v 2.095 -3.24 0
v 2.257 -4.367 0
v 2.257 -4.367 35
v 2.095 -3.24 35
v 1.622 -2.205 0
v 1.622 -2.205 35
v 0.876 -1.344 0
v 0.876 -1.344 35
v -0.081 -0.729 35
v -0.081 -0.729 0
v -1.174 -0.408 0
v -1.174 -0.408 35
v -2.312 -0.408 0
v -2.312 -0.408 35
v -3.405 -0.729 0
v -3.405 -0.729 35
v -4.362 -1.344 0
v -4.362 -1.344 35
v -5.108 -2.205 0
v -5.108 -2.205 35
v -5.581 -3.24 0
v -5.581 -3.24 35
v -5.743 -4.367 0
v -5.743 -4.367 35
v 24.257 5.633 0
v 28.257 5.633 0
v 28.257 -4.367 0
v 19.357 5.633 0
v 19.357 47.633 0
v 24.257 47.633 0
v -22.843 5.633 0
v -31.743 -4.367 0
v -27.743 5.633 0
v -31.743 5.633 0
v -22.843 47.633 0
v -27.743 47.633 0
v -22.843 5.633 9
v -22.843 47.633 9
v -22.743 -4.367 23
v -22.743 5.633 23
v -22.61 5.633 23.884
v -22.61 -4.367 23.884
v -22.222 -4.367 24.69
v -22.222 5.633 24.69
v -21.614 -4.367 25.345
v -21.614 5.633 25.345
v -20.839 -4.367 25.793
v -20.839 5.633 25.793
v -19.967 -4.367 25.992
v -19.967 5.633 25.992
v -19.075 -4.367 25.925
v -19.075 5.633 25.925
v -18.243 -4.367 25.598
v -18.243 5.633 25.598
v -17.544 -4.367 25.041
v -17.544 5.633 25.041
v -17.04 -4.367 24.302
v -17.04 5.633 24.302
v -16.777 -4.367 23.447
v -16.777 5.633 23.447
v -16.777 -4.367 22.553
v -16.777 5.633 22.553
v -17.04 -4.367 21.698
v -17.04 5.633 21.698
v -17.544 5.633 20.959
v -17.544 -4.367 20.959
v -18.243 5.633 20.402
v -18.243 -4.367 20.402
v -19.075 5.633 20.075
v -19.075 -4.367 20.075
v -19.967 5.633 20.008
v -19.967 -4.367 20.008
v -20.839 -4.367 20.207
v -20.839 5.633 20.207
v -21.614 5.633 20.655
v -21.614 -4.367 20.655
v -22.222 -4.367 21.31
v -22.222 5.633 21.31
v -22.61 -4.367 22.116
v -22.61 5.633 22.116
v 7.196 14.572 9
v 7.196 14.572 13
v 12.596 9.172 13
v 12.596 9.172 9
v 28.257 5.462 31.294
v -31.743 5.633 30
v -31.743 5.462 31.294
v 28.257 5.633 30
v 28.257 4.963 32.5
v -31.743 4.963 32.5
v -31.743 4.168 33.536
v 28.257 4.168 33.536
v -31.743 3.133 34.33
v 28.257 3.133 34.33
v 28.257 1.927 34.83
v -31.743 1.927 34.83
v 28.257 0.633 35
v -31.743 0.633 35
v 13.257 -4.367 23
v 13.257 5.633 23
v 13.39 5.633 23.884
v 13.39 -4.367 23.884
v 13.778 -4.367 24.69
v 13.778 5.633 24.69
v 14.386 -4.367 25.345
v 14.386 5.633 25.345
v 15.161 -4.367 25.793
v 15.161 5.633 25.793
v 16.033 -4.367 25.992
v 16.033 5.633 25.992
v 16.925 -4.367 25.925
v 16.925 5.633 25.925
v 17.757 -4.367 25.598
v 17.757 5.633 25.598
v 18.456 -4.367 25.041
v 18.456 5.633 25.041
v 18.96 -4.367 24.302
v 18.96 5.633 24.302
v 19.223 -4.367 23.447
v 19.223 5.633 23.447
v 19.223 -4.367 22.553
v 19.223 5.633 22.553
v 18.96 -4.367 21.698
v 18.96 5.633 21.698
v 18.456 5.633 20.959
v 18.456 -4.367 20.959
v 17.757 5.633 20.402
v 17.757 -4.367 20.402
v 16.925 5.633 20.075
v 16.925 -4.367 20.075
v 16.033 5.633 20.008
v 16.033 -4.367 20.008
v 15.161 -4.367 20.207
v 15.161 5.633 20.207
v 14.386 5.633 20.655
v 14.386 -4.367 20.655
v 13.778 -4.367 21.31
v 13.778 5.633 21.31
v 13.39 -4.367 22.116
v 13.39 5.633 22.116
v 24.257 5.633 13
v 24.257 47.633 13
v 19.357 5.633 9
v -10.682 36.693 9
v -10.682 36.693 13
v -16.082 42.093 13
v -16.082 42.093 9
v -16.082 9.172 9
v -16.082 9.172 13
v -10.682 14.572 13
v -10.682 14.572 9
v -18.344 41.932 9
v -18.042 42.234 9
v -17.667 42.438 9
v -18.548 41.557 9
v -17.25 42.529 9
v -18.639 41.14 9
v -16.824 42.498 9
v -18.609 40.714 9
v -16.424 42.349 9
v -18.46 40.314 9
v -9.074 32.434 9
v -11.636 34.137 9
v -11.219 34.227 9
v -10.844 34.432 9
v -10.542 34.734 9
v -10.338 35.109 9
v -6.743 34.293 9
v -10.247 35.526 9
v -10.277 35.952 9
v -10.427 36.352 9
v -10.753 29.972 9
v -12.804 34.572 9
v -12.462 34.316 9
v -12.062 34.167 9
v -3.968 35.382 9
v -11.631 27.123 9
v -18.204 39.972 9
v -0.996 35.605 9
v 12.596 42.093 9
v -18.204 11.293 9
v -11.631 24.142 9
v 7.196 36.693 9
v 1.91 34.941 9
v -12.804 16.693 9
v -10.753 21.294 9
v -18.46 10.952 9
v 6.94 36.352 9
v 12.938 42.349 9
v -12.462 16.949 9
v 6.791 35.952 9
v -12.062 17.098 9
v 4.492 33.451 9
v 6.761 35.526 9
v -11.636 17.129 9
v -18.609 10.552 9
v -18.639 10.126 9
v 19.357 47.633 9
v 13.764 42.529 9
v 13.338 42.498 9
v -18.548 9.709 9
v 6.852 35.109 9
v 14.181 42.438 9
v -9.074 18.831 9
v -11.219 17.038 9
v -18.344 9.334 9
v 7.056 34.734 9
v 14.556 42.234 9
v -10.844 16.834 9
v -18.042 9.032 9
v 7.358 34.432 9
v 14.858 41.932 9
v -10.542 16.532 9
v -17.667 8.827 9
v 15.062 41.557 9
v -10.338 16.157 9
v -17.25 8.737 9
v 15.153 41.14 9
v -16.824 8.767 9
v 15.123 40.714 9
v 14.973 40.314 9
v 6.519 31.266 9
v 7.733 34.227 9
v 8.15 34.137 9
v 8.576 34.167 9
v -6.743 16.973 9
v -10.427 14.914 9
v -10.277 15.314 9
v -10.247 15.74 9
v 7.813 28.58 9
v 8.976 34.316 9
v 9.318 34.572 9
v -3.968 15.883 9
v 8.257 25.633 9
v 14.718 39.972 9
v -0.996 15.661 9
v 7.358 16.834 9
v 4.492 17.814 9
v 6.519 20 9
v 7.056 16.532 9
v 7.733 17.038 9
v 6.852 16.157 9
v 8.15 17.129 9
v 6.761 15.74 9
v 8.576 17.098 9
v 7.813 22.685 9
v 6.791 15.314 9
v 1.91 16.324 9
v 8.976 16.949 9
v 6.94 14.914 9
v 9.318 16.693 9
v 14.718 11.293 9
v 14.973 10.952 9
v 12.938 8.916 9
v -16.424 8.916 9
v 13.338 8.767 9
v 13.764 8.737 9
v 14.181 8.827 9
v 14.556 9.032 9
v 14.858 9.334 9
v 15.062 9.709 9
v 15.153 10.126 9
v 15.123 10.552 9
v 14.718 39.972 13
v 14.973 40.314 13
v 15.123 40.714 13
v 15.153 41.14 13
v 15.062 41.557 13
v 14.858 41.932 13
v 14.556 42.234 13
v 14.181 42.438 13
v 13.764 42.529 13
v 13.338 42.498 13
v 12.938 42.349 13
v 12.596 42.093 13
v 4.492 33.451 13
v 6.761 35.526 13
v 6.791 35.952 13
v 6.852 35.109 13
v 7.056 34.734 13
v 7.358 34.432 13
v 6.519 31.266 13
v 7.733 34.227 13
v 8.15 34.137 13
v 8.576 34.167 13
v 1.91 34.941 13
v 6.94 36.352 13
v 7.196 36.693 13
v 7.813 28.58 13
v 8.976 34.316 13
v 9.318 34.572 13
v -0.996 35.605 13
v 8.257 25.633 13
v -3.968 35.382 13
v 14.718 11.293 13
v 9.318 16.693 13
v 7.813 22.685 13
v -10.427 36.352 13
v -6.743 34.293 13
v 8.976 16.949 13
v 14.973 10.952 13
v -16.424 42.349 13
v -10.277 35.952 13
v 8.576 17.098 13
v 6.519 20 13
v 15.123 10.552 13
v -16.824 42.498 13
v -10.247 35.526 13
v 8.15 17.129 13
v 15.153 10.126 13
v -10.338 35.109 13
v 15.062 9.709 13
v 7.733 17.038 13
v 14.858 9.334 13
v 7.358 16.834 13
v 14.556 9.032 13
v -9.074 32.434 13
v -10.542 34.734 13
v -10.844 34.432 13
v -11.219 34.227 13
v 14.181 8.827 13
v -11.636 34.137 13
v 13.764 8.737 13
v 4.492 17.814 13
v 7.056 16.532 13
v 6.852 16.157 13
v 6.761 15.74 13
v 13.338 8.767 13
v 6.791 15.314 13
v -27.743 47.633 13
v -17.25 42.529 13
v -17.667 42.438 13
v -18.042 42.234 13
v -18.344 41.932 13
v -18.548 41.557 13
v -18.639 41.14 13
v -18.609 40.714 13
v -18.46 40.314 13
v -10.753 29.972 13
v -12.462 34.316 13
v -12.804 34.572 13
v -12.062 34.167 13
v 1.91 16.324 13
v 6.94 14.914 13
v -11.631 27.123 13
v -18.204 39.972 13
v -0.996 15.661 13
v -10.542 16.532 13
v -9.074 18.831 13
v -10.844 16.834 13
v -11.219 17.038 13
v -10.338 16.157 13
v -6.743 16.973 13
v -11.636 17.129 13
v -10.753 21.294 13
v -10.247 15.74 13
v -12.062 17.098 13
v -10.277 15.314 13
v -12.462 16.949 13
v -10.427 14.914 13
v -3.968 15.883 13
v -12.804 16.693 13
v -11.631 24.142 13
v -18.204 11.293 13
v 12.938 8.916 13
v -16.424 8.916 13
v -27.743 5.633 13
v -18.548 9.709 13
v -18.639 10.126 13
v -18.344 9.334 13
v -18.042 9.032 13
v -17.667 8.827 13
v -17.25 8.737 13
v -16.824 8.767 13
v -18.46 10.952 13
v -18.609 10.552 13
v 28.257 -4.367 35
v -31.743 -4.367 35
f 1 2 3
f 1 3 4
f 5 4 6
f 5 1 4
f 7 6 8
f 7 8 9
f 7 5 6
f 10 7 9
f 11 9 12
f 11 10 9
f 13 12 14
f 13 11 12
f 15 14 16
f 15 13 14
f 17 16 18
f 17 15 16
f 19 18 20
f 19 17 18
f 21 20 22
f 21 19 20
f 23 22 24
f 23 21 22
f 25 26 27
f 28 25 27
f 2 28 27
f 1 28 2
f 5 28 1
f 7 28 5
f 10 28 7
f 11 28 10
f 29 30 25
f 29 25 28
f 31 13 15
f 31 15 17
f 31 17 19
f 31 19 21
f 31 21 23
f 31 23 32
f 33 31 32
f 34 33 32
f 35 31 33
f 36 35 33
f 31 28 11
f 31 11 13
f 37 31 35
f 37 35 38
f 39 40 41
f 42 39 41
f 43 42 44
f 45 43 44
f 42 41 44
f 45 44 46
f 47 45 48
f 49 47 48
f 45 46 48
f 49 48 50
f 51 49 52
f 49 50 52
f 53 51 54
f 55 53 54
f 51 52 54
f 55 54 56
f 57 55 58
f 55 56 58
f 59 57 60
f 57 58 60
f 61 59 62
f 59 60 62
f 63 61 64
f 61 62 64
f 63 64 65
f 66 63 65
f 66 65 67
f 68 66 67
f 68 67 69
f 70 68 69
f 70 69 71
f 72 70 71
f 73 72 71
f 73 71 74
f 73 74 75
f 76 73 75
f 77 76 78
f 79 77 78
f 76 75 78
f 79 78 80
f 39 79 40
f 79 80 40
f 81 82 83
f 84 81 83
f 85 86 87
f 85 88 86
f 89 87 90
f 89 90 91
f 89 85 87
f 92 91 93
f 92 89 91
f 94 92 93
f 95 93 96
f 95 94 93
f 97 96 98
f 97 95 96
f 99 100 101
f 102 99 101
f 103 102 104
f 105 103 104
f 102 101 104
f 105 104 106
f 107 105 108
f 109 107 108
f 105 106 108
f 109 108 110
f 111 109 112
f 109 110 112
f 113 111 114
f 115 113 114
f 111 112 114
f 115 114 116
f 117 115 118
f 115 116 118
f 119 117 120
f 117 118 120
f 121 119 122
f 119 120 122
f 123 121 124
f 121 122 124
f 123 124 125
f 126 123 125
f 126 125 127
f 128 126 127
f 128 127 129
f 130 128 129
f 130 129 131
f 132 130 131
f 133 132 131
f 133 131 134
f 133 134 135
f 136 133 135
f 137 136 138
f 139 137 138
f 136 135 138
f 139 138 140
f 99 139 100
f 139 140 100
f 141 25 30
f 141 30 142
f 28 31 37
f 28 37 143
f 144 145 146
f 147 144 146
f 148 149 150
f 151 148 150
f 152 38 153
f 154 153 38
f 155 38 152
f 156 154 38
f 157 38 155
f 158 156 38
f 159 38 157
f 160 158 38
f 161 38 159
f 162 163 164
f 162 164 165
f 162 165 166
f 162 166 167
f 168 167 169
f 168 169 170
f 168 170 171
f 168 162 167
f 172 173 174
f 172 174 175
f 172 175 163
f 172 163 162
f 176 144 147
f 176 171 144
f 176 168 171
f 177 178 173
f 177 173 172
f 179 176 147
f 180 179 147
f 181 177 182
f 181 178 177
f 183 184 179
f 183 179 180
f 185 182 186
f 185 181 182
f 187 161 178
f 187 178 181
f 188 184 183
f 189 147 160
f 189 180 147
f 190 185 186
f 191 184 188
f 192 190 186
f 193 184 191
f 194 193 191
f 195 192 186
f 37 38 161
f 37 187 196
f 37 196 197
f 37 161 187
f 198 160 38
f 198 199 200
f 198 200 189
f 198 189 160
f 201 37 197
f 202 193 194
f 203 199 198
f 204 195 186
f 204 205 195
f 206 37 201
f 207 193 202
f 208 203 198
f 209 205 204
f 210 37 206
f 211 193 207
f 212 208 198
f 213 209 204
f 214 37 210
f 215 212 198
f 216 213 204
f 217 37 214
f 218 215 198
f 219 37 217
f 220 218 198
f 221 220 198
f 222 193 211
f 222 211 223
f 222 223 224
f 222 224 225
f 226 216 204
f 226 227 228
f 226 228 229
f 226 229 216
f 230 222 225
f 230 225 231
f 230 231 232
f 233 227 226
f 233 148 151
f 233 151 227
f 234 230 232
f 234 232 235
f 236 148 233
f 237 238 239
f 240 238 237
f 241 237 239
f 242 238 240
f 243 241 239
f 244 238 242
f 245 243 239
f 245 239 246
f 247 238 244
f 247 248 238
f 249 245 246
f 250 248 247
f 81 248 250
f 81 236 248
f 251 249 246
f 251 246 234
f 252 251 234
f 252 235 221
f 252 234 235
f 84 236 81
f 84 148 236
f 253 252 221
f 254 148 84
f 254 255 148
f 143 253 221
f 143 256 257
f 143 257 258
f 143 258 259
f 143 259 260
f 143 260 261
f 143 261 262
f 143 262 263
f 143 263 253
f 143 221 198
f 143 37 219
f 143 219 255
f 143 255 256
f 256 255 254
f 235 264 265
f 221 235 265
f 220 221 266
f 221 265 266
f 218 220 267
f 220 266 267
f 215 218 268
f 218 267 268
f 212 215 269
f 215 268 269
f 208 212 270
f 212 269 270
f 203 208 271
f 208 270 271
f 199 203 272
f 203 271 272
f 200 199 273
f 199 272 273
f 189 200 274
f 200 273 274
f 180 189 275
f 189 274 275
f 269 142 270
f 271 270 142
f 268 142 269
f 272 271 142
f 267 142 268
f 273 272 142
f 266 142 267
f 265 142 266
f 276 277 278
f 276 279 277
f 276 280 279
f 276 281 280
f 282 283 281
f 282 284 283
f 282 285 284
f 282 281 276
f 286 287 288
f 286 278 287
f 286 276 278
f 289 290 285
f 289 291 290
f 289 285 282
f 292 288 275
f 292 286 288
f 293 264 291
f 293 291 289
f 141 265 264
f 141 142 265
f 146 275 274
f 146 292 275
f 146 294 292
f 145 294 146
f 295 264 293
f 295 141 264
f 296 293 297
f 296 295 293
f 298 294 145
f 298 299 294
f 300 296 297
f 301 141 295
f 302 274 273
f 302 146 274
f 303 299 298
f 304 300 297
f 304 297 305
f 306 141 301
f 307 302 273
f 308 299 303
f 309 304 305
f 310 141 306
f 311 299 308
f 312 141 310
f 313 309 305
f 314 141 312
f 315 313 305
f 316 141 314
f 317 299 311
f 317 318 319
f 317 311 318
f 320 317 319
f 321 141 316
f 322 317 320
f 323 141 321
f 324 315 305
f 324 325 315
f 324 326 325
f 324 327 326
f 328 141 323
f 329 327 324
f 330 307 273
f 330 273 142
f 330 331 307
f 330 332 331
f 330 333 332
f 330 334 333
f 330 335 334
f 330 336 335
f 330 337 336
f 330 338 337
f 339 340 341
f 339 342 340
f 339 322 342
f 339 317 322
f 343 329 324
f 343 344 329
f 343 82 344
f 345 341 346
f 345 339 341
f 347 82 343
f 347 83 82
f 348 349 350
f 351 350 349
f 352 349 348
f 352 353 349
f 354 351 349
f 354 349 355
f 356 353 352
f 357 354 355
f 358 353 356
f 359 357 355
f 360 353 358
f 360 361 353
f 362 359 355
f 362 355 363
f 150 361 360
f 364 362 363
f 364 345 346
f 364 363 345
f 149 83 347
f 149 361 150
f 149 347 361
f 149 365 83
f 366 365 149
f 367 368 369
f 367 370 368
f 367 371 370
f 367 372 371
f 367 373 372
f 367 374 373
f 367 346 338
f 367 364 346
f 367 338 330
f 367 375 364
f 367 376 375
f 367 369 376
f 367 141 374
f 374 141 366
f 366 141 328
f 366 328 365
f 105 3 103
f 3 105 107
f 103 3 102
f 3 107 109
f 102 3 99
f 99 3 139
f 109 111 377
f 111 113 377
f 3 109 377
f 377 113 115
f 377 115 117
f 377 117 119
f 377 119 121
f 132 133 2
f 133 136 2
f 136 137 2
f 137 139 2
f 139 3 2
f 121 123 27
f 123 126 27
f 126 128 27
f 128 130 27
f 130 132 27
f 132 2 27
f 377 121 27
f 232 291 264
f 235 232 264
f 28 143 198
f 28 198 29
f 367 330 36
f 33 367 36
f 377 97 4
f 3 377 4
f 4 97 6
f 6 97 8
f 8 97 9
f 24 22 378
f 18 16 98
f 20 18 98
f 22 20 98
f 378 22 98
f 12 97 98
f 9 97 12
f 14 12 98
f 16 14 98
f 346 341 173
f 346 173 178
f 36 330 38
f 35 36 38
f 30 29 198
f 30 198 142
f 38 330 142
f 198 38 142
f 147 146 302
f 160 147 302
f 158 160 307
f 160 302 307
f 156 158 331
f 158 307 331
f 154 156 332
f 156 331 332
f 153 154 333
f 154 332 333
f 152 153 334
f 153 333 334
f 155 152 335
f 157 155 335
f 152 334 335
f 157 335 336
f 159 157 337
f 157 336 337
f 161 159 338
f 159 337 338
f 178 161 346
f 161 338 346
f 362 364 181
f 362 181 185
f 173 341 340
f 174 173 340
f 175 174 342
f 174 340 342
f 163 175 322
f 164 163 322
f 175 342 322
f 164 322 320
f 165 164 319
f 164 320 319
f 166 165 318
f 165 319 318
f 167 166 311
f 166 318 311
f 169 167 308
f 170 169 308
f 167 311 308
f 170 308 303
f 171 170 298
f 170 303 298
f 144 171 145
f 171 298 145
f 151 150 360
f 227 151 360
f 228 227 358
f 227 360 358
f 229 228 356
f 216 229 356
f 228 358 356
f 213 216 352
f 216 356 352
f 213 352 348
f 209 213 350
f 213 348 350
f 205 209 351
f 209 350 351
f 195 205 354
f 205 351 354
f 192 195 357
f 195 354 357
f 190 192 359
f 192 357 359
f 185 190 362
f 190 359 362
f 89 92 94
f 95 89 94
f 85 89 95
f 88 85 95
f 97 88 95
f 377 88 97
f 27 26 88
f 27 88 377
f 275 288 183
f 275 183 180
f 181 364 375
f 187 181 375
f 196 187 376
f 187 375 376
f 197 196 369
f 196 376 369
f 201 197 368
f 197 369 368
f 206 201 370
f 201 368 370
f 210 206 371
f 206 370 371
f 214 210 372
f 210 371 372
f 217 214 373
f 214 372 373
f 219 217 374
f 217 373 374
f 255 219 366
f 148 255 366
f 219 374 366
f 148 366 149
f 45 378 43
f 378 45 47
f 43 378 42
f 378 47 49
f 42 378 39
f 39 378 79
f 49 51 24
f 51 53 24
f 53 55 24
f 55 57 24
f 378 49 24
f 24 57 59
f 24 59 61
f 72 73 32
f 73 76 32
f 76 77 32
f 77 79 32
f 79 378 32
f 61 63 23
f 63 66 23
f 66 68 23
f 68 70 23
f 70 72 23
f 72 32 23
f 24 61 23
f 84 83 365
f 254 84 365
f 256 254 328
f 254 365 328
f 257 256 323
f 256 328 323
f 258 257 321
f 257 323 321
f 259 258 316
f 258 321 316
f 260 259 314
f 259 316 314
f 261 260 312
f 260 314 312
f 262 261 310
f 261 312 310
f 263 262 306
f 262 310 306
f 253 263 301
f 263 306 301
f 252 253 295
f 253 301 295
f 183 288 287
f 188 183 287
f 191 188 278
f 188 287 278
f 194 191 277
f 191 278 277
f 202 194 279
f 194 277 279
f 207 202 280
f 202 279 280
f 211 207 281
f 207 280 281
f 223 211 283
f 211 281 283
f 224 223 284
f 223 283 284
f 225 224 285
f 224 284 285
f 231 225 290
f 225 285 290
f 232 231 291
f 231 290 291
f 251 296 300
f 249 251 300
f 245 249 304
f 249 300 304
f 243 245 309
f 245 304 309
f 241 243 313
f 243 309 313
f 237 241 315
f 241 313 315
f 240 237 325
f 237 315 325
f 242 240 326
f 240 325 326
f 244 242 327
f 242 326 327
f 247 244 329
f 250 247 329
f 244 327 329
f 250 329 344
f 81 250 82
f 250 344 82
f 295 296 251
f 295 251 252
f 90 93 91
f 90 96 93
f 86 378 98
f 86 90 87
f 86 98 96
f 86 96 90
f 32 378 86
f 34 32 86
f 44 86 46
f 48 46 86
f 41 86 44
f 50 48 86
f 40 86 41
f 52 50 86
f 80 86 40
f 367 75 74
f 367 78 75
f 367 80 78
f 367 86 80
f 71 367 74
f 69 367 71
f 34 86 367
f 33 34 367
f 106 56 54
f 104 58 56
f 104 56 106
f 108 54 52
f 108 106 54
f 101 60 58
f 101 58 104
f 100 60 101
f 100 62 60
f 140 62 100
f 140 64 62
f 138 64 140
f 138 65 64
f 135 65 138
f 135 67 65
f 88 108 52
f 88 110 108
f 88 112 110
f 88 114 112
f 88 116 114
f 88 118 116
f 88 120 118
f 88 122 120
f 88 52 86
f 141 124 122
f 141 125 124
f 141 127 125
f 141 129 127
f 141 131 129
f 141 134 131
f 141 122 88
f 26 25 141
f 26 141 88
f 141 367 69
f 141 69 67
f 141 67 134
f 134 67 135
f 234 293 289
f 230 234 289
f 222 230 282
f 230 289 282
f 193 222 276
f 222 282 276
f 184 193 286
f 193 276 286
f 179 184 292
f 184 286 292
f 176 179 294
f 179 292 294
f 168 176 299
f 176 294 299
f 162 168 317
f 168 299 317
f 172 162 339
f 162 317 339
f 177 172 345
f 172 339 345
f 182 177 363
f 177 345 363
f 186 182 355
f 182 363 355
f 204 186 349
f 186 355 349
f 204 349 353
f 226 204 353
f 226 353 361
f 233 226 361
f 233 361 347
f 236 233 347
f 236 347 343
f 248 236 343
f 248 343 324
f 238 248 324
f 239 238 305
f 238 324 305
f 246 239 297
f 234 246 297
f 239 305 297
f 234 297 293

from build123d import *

# Parameters (mm, degrees)
SKETCH003_R  = 10
PAD003_DEPTH = 4
SKETCH001_R  = 3
PAD002_DEPTH = 10
PAD001_DEPTH = 35
PAD_DEPTH    = 42
FILLET_R     = 5


with BuildPart() as motormount:
    # Sketch003 → Pad003 (new body)
    with BuildSketch(Plane.XY.offset(13)):
        with Locations((-1.743039, 25.632756)):
            Circle(SKETCH003_R)
        with BuildLine():
            ThreePointArc((14.71762, 39.972094), (14.717625, 42.093413), (12.596306, 42.093421))
            Line((7.196308, 36.693422), (12.596306, 42.093421))
            ThreePointArc((7.196308, 36.693422), (7.196301, 34.572096), (9.317627, 34.572101))
            Line((9.317627, 34.572101), (14.71762, 39.972094))
        make_face()
        with BuildLine():
            ThreePointArc((12.596306, 9.172091), (14.717625, 9.172099), (14.71762, 11.293417))
            Line((9.317628, 16.693409), (14.71762, 11.293417))
            ThreePointArc((9.317628, 16.693409), (7.196301, 16.693416), (7.196308, 14.572089))
            Line((7.196308, 14.572089), (12.596306, 9.172091))
        make_face()
        with BuildLine():
            ThreePointArc((-16.082385, 42.093423), (-18.203705, 42.09341), (-18.203694, 39.972091))
            Line((-12.803692, 34.572088), (-18.203694, 39.972091))
            ThreePointArc((-12.803692, 34.572088), (-10.682372, 34.572101), (-10.682383, 36.693421))
            Line((-10.682383, 36.693421), (-16.082385, 42.093423))
        make_face()
        with BuildLine():
            ThreePointArc((-18.203691, 11.293424), (-18.203707, 9.172104), (-16.082386, 9.172087))
            Line((-16.082386, 9.172087), (-10.682386, 14.572088))
            ThreePointArc((-10.682386, 14.572088), (-10.68237, 16.693408), (-12.80369, 16.693424))
            Line((-18.203691, 11.293424), (-12.80369, 16.693424))
        make_face()
    extrude(amount=-PAD003_DEPTH)


with BuildPart() as cutblock:
    # Sketch001 → Pad002 (new body)
    with BuildSketch(Plane(origin=(0, 5.632756, 0), x_dir=(-1, 0, 0), z_dir=(0, 1, 0))):
        with Locations((-16.256961, 23)):
            Circle(SKETCH001_R)
        with Locations((19.743039, 23)):
            Circle(SKETCH001_R)
    extrude(amount=-PAD002_DEPTH)

    # Fusion001: union MotorMount
    add(motormount.part)


with BuildPart() as base:
    # Sketch → Pad001 (new body)
    with BuildSketch(Plane.XY):
        with BuildLine():
            Line((-31.743039, 5.632756), (28.256961, 5.632756))
            Line((28.256961, 5.632756), (28.256961, -4.367244))
            Line((2.256961, -4.367244), (28.256961, -4.367244))
            ThreePointArc((2.256961, -4.367244), (-1.743039, -0.367244), (-5.743039, -4.367244))
            Line((-31.743039, -4.367244), (-5.743039, -4.367244))
            Line((-31.743039, -4.367244), (-31.743039, 5.632756))
        make_face()
    extrude(amount=PAD001_DEPTH)


with BuildPart() as fillet_body:
    # Sketch002 → Pad (new body)
    with BuildSketch(Plane(origin=(0, 5.632756, 0), x_dir=(-1, 0, 0), z_dir=(0, 1, 0))):
        Polygon((-24.256961, 13), (27.743039, 13), (27.743039, 0), (22.843039, 0), (22.843039, 9), (-19.356961, 9), (-19.356961, 0), (-24.256961, 0), align=None)
    extrude(amount=PAD_DEPTH)

    # Fusion: union Base
    add(base.part)

    # Cut: cut CutBlock
    add(cutblock.part, mode=Mode.SUBTRACT)

    # Fillet
    fillet_edges = [fillet_body.edges().sort_by_distance(p)[0] for p in [
        (-1.743039, 5.632756, 35),
    ]]
    fillet(fillet_edges, radius=FILLET_R)


solid = fillet_body.part
